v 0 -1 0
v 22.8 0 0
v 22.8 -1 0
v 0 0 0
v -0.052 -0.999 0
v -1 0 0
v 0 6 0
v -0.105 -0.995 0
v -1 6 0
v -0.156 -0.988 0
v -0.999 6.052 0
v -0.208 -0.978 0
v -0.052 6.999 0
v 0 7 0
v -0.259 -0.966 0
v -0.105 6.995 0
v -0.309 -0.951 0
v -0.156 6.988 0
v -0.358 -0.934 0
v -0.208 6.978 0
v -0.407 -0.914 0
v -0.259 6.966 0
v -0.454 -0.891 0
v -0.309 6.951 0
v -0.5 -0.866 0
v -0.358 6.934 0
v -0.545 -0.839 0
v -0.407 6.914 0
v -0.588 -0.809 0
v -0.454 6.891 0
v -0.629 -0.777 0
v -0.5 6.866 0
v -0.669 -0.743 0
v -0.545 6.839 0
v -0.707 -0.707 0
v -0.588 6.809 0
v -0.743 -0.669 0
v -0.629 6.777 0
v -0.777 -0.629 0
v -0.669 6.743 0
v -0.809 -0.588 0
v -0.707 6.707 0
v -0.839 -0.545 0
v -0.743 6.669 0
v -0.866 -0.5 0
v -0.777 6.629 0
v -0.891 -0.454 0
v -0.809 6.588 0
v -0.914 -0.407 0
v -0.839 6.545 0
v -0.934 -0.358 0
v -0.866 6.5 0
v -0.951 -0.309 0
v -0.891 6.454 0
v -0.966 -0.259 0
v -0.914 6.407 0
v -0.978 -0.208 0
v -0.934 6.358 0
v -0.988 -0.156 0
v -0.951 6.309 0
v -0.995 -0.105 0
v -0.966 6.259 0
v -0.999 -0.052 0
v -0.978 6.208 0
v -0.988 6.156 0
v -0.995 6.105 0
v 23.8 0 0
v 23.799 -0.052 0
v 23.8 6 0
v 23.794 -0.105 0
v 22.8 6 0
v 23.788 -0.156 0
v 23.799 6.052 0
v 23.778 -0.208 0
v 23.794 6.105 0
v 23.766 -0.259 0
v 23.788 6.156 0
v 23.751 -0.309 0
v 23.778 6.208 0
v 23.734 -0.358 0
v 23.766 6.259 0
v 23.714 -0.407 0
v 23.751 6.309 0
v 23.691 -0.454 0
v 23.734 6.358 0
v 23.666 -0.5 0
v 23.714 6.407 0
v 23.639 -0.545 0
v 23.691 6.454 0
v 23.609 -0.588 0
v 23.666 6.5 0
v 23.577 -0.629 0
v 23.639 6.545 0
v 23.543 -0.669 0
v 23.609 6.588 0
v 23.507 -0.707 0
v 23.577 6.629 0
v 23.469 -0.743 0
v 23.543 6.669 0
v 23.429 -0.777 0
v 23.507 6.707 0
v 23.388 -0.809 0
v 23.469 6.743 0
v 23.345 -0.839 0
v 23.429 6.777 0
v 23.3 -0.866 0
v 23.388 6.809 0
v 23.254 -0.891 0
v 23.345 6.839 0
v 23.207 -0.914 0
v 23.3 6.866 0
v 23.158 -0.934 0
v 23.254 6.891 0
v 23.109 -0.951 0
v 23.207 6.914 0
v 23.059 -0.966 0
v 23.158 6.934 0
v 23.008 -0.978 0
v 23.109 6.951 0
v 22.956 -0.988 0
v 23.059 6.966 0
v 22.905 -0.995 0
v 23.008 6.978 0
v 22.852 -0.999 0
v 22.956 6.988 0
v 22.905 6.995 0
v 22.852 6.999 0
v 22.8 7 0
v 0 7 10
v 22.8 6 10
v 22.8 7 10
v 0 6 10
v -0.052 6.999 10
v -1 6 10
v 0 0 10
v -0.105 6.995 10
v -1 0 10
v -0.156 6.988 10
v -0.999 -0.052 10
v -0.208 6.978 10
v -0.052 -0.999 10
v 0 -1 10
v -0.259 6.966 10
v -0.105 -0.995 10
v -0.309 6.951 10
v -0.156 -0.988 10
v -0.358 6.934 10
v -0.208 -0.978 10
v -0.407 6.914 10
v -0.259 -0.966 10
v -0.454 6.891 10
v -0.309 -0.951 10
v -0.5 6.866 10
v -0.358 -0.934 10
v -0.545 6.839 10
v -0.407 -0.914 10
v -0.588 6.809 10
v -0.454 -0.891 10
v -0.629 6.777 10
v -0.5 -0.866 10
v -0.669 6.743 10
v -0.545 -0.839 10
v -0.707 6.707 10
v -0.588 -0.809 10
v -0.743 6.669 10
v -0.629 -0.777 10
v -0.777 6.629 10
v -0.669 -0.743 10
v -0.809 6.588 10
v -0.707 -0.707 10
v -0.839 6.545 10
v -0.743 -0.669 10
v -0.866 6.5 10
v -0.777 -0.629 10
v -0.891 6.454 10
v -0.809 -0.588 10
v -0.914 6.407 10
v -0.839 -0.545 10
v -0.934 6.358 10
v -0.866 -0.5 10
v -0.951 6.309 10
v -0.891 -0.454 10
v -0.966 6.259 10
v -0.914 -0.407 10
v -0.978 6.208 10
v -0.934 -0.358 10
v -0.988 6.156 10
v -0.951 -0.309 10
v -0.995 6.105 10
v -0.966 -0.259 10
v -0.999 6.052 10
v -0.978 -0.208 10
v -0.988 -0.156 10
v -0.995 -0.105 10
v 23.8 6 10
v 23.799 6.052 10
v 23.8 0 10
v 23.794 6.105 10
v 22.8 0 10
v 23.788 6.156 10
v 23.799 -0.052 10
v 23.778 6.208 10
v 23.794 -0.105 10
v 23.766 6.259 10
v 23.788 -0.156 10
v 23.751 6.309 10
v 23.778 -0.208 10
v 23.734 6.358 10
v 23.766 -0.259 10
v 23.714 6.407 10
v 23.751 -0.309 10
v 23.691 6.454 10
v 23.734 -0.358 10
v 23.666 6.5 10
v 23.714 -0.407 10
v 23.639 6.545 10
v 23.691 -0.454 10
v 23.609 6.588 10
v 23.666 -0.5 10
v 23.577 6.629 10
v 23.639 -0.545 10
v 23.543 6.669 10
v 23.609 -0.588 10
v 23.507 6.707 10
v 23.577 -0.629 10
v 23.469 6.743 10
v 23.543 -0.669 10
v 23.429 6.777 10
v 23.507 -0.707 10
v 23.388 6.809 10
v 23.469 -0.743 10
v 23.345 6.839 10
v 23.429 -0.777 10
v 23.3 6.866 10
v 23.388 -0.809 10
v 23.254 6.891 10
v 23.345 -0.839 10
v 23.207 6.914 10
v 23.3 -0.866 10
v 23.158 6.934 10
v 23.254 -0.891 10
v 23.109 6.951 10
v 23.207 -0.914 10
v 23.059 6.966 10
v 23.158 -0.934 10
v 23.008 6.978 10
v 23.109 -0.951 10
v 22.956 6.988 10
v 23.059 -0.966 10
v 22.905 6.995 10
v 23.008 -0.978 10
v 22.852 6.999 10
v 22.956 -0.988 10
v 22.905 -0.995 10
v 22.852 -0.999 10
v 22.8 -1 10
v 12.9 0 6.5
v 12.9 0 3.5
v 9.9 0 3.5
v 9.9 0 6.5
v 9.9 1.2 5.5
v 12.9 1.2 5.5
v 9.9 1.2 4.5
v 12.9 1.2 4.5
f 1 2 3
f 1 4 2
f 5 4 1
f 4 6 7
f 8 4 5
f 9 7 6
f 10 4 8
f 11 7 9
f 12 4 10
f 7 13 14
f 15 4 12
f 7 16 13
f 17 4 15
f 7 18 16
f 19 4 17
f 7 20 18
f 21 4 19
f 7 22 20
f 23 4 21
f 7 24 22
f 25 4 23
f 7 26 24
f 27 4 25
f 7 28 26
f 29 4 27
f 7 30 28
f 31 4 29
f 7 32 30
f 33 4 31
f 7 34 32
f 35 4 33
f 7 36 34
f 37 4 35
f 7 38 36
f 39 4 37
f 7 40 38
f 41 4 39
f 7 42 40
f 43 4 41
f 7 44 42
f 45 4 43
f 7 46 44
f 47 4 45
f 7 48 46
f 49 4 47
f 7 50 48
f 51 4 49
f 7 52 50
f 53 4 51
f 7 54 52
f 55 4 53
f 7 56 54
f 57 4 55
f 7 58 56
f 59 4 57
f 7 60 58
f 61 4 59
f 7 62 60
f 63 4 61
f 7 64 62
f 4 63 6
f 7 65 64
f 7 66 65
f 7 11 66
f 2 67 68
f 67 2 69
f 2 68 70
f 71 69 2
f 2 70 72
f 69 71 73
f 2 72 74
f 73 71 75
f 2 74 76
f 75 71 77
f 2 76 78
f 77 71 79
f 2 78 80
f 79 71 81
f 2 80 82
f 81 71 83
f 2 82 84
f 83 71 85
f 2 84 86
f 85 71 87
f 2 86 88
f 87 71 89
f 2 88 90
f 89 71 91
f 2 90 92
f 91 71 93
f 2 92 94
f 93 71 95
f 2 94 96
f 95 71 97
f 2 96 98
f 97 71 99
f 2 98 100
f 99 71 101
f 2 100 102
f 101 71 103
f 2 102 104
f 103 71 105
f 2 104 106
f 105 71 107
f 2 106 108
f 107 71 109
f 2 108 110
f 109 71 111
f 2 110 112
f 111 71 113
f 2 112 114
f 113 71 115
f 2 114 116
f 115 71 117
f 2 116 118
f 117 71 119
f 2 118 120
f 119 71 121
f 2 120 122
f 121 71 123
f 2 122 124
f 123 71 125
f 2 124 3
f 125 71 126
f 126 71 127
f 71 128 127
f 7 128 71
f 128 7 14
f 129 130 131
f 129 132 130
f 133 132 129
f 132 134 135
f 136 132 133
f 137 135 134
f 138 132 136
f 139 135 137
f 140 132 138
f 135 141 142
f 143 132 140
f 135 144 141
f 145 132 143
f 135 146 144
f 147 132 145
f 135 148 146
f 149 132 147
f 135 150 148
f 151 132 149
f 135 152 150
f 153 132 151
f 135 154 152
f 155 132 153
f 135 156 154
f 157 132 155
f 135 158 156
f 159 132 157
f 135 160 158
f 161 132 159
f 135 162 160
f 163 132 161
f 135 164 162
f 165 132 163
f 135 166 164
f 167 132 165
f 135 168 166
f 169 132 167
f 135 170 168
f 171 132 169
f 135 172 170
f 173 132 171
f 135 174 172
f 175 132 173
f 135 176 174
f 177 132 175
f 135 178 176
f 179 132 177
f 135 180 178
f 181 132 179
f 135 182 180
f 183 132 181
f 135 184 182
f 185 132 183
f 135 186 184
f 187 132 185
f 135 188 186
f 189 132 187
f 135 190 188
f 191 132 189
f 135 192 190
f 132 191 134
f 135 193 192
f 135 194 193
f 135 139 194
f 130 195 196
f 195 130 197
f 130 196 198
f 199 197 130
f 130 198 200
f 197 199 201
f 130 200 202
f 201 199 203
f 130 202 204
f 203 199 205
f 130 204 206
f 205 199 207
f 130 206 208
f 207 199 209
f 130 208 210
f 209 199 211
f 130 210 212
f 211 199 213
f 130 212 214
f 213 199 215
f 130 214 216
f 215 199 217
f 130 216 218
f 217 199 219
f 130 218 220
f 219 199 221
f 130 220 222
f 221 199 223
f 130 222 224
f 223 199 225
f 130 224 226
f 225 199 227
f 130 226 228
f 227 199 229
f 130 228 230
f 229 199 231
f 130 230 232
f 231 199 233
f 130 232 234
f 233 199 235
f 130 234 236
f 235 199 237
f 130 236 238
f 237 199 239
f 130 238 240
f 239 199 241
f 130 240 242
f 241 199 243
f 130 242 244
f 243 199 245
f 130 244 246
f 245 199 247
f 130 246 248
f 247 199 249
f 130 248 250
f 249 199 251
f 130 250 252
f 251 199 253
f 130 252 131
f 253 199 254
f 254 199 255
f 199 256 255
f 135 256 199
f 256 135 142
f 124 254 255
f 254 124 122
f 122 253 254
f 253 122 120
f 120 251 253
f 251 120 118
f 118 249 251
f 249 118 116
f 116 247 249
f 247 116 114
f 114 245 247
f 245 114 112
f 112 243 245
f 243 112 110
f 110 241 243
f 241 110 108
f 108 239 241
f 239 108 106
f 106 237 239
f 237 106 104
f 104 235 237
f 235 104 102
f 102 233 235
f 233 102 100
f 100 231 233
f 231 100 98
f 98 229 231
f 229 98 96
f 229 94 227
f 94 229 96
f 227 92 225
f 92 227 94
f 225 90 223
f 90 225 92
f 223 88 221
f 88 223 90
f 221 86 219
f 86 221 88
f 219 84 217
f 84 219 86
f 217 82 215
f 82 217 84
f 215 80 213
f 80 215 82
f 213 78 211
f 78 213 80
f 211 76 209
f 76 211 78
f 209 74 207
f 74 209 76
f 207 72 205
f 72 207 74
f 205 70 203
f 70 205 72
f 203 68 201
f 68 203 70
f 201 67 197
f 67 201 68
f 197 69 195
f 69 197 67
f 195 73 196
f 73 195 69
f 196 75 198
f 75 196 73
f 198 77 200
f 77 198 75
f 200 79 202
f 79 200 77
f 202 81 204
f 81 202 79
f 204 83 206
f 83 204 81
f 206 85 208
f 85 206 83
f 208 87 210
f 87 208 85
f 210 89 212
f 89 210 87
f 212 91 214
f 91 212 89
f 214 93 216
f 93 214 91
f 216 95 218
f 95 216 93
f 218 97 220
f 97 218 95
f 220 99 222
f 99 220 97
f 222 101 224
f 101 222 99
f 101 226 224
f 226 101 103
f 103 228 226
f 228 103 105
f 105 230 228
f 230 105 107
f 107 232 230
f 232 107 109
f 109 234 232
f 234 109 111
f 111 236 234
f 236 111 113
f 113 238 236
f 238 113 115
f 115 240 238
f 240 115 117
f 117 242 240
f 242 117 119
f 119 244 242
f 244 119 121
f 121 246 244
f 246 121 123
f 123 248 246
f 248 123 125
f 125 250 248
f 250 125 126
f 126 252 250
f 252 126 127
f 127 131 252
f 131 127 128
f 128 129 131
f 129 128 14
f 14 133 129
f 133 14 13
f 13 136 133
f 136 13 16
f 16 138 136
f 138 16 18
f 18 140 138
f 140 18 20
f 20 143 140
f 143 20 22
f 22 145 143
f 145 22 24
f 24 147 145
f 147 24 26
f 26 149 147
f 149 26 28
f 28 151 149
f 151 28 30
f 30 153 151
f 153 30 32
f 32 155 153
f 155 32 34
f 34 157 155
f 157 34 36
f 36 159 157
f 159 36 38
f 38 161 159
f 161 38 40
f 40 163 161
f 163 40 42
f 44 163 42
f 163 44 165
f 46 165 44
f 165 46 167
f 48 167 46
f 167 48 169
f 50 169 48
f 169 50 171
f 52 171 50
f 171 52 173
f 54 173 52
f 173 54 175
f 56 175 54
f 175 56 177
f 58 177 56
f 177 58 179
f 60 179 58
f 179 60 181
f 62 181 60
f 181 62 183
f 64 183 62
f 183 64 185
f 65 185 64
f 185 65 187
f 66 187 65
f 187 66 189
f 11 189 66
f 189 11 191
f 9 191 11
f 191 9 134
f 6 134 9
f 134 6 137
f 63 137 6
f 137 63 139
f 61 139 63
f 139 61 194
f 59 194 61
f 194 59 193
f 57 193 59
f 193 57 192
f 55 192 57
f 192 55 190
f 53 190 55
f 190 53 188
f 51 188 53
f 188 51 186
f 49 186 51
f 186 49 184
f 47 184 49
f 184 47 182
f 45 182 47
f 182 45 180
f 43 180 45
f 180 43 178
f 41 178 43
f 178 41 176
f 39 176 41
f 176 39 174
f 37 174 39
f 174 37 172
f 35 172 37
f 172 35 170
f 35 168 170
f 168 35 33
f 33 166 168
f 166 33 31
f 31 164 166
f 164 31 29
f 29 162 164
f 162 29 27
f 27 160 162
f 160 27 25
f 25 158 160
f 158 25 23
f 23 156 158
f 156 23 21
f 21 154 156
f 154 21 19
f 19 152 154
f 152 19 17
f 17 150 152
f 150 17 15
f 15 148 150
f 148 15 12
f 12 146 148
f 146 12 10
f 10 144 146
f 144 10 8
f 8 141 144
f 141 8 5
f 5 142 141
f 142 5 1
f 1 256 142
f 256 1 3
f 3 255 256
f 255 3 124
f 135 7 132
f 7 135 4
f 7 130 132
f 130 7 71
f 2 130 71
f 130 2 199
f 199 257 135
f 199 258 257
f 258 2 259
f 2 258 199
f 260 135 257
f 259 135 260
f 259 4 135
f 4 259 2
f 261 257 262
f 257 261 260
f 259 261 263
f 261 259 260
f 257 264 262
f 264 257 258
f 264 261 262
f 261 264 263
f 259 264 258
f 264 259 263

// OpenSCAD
A=22.8;// 
B=6;
H=10;

module stopper(){
   //3x3 
    rotate([0,90,0])
    linear_extrude(height=3, center=true)
    polygon([[0,0], [3,0], [2,1.2], [1,1.2]]);
}


linear_extrude(height=H)
difference(){
    minkowski(){
        square([A,B]);
        circle(r=1, $fn=120);
    }
    square([A,B]);
}

translate([A/2,0,H/2+1.5])

stopper();
